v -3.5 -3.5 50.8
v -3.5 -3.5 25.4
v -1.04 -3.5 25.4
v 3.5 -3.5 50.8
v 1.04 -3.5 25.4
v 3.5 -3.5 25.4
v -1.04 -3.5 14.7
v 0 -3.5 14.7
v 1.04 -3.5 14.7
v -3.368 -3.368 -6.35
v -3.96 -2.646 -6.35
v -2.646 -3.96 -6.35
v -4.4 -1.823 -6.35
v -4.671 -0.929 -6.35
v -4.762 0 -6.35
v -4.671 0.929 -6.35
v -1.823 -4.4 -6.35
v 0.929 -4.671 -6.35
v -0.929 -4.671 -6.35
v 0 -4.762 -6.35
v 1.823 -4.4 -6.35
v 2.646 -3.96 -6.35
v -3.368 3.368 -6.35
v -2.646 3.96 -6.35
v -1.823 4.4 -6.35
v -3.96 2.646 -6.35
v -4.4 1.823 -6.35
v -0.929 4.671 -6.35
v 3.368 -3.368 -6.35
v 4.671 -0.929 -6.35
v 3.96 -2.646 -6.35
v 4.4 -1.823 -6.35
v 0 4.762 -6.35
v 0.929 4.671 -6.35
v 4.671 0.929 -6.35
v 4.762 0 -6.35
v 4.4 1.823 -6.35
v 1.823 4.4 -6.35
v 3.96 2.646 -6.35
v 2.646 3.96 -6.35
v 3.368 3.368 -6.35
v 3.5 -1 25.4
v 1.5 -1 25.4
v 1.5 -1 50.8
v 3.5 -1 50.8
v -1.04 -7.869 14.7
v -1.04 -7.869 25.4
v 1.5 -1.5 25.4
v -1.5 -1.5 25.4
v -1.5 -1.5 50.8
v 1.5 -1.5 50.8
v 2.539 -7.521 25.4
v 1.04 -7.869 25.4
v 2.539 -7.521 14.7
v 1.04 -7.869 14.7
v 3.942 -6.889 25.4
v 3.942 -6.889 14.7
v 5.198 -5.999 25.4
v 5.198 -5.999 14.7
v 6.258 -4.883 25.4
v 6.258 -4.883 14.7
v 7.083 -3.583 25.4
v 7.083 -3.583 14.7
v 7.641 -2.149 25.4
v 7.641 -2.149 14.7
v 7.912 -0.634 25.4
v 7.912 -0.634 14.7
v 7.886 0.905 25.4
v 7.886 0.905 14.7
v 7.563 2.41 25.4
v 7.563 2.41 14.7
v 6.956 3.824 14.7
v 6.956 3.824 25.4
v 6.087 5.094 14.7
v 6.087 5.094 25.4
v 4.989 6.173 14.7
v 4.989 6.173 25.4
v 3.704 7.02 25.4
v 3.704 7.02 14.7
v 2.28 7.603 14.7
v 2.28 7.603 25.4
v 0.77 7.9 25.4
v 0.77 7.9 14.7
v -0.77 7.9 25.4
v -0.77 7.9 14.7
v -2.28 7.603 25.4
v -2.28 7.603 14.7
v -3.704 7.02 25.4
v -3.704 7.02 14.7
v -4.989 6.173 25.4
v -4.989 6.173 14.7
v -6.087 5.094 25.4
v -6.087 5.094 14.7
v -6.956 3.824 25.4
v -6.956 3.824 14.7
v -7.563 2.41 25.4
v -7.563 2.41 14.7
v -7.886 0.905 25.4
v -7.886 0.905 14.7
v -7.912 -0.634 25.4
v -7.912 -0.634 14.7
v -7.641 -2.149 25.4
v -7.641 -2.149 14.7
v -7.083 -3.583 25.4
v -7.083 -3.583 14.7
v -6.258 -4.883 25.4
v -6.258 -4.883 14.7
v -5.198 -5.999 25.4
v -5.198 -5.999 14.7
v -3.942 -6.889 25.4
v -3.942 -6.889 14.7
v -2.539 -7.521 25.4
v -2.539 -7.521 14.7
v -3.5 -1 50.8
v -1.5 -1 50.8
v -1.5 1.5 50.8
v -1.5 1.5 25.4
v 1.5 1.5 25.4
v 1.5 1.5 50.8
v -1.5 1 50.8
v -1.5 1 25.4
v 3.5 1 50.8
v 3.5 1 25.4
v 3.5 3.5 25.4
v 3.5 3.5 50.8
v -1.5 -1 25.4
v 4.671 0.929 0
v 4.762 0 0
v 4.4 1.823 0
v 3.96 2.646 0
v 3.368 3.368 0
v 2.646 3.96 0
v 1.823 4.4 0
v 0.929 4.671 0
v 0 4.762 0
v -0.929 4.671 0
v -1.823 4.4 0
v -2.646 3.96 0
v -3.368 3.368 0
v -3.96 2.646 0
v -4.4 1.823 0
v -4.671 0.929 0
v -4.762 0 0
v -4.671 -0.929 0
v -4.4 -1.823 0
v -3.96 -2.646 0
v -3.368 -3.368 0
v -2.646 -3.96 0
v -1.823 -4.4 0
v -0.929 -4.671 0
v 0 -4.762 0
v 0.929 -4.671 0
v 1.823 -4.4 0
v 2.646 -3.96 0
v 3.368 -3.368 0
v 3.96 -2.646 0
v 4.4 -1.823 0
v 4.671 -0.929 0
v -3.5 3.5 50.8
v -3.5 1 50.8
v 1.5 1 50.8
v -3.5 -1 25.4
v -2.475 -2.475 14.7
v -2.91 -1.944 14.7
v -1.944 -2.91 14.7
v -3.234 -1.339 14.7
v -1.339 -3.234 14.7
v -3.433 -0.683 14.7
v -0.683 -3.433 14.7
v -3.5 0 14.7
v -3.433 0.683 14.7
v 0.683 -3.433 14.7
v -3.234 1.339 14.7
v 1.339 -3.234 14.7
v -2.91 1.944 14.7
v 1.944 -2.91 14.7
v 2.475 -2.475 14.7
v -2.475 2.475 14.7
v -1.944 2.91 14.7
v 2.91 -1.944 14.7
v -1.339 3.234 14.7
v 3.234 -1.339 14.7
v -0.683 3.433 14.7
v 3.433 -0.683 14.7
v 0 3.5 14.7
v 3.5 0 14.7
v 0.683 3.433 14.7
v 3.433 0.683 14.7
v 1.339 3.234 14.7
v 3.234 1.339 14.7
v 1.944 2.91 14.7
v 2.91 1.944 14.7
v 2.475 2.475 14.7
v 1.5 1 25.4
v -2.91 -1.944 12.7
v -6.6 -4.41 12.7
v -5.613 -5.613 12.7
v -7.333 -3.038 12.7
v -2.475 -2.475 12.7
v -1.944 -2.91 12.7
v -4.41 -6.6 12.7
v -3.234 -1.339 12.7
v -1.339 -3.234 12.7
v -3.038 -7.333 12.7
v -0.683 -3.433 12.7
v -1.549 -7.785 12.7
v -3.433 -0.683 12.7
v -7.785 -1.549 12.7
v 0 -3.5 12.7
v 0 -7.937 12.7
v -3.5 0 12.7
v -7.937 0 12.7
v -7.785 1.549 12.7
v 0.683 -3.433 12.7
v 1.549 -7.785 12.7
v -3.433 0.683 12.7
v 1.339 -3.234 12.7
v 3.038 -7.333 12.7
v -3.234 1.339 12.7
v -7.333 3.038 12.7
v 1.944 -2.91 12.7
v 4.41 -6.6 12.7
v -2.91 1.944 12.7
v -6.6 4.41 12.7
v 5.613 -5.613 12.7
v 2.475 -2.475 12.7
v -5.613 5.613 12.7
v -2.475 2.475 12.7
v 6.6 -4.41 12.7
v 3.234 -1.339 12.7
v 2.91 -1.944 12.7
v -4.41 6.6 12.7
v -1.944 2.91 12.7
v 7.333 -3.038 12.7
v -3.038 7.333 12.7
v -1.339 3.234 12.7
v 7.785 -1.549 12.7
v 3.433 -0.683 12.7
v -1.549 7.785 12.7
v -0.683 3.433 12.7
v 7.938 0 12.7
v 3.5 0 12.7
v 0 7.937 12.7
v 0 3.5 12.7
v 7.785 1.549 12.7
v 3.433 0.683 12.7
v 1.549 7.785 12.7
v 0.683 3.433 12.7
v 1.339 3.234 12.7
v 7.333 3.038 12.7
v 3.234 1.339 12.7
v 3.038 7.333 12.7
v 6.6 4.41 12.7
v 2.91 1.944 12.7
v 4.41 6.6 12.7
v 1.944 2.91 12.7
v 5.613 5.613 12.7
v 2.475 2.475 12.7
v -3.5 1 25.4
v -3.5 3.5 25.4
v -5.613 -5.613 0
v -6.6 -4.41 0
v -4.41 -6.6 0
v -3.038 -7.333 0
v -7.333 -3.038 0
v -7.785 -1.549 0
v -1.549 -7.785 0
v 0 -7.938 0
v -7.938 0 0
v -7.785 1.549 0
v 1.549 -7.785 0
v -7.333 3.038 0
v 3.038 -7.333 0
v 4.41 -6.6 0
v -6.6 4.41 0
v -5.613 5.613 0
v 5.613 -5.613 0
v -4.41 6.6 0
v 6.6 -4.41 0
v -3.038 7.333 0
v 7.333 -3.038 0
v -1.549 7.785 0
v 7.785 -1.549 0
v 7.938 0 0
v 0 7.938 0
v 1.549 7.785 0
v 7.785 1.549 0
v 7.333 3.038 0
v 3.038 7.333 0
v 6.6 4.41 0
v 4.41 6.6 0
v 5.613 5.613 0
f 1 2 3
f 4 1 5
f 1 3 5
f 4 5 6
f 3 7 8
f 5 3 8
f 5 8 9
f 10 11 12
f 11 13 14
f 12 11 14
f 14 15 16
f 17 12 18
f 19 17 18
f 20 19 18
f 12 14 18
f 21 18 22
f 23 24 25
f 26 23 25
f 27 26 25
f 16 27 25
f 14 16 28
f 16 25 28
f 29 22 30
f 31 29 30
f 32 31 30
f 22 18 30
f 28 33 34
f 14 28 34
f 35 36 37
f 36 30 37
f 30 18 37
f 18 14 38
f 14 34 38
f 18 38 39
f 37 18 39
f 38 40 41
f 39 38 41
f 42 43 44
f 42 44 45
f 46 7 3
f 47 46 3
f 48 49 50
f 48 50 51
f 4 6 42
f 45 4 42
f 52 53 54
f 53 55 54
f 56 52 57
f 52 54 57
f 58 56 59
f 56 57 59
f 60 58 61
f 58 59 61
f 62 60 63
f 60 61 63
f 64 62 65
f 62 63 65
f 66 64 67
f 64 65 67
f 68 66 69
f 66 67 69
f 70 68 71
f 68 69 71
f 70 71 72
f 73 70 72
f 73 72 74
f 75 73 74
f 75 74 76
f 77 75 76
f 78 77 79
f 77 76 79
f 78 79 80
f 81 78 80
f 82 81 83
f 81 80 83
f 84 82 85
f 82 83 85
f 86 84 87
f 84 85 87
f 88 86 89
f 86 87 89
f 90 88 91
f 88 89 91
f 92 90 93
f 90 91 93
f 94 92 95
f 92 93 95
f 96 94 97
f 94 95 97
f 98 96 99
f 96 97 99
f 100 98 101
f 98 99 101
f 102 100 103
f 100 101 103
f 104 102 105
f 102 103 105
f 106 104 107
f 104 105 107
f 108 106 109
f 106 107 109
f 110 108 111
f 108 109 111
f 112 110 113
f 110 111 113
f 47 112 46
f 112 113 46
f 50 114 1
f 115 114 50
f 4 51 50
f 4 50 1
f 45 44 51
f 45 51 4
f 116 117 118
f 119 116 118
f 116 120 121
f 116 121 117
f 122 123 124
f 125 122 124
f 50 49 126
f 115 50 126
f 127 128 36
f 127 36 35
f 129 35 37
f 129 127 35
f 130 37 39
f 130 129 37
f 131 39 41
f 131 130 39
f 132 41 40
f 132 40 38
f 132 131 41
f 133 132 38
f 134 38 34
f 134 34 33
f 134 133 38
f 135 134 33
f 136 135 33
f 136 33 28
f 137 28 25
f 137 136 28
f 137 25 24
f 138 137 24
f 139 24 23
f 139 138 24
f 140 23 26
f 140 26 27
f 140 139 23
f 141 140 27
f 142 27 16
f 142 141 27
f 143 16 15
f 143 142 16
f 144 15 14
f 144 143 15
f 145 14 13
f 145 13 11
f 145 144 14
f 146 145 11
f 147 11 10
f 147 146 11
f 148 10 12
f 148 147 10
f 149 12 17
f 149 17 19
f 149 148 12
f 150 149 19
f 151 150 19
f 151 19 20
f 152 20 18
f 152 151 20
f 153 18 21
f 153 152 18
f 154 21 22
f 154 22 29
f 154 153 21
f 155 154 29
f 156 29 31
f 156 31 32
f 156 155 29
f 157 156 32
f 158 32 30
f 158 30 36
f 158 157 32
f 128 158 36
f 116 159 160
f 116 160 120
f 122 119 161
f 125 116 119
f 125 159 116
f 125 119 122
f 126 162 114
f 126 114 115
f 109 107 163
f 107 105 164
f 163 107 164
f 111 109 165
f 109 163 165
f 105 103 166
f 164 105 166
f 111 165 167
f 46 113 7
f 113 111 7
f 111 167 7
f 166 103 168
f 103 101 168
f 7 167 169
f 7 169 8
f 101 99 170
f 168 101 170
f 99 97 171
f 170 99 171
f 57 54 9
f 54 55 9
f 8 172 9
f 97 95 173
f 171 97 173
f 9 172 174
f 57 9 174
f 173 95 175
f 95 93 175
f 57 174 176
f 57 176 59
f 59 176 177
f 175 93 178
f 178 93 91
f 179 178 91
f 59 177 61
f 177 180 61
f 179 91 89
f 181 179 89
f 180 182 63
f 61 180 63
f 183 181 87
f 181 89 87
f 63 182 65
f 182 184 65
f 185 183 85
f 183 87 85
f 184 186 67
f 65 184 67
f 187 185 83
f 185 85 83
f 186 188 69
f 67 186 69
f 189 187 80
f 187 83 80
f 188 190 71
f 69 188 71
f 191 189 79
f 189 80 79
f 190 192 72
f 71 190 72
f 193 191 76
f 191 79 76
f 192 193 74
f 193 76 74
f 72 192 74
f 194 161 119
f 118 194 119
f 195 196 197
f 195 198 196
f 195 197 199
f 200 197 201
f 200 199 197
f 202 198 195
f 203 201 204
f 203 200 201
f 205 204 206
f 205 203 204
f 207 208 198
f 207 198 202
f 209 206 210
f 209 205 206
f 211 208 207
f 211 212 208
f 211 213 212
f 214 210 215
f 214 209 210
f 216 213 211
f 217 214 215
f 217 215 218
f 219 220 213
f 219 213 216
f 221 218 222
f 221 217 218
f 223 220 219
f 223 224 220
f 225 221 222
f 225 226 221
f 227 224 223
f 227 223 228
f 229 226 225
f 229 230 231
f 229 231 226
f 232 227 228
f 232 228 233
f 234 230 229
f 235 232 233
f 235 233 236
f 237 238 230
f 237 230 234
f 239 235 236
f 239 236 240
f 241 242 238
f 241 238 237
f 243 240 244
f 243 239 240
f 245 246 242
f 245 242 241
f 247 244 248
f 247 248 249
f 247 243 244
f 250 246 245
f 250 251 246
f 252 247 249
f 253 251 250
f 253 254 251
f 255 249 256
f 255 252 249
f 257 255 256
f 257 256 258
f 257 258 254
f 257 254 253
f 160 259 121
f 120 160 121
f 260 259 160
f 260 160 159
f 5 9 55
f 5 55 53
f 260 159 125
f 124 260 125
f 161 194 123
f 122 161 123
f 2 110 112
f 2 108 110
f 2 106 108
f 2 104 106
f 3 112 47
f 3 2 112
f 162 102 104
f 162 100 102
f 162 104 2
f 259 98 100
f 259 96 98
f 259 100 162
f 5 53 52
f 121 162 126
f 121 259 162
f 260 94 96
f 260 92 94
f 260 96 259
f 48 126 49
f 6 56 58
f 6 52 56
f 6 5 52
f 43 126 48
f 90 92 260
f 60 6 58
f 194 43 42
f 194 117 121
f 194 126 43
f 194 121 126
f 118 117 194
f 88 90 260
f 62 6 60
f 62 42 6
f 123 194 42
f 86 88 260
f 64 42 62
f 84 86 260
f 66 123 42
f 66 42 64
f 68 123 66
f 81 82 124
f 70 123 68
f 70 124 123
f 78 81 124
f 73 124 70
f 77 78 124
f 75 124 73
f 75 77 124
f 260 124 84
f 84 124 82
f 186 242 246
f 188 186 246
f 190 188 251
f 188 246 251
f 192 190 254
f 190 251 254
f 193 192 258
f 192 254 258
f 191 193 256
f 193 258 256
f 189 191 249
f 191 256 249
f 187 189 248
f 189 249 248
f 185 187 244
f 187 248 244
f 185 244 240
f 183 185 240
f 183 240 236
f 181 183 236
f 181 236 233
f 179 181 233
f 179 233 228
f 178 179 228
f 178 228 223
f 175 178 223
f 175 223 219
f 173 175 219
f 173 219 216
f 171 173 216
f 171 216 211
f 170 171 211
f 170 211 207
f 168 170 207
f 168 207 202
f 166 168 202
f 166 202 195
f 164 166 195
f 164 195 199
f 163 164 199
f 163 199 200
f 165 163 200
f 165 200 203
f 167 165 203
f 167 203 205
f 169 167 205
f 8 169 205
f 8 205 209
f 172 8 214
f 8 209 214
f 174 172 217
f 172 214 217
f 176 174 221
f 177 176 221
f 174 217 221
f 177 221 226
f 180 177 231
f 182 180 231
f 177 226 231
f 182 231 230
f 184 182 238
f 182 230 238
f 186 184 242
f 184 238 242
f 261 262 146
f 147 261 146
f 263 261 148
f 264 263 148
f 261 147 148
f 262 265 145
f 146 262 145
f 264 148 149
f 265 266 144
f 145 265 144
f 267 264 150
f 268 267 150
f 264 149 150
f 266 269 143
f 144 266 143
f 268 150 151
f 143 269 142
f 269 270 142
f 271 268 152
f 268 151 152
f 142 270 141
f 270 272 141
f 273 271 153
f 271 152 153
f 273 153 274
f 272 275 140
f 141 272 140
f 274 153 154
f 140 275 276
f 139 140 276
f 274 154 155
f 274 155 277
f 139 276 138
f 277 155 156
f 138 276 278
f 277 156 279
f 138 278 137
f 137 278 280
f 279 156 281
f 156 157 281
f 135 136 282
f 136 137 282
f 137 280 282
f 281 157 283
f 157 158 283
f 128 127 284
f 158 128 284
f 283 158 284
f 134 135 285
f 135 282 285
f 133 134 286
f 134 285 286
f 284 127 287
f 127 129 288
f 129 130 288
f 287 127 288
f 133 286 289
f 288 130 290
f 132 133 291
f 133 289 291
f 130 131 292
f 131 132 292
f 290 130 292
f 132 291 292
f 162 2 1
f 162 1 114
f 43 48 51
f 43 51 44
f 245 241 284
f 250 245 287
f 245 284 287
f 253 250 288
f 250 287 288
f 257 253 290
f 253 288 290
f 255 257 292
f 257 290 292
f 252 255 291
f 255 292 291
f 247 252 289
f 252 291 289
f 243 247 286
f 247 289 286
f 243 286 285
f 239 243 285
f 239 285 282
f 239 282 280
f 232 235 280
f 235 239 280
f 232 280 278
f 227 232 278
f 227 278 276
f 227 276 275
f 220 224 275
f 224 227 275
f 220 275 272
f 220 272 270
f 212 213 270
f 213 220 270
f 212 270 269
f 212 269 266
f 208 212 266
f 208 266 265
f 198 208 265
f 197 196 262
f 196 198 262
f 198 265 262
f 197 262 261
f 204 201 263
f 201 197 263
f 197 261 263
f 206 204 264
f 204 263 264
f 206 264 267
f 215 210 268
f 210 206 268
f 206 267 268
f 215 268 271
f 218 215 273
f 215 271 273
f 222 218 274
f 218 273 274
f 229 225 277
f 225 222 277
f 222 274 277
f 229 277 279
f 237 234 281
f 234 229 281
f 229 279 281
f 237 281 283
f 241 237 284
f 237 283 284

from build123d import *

# Parameters (mm, degrees)
F0_R      = 7.9375
F1_DEPTH  = 25.4
F2_R      = 4.7625
F3_DEPTH  = 6.35
F4_W      = 7
F4_H      = 7
F5_DEPTH  = 25.4
F6_W      = 3
F6_H      = 3
F7_DEPTH  = 25.4
F9_W      = 15.748512
F9_H      = 2
F10_DEPTH = 25.4
F12_W     = 2.079316
F12_H     = 12.7
F13_DEPTH = 25.4
F15_R     = 7.9375
F15_R_2   = 3.5
F16_DEPTH = 2


with BuildPart() as f1:
    # F0 (on Top) → F1 (new body)
    with BuildSketch(Plane.XY):
        Circle(F0_R)
    extrude(amount=F1_DEPTH)

    # F2 (on Top) → F3 (join)
    with BuildSketch(Plane.XY):
        Circle(F2_R)
    extrude(amount=-F3_DEPTH)

    # F4 (on face) → F5 (join)
    with BuildSketch(Plane.XY.offset(25.4)):
        Rectangle(F4_W, F4_H)
    extrude(amount=F5_DEPTH)


with BuildPart() as f7:
    # F6 (on face) → F7 (new body)
    with BuildSketch(Plane.XY.offset(25.4)):
        Rectangle(F6_W, F6_H)
    extrude(amount=F7_DEPTH)


with BuildPart() as f1_1:
    add(f1.part)

    # F8: cut F7
    add(f7.part, mode=Mode.SUBTRACT)


with BuildPart() as f10:
    # F9 (on face) → F10 (new body)
    with BuildSketch(Plane.XY.offset(25.4)):
        Rectangle(F9_W, F9_H)
    extrude(amount=F10_DEPTH)


with BuildPart() as f1_2:
    add(f1_1.part)

    # F11: cut F10
    add(f10.part, mode=Mode.SUBTRACT)


with BuildPart() as f13:
    # F12 (on face) → F13 (new body)
    with BuildSketch(Plane.XZ.offset(3.5)):
        with Locations((0, 19.05)):
            Rectangle(F12_W, F12_H)
    extrude(amount=F13_DEPTH)


with BuildPart() as f1_3:
    add(f1_2.part)

    # F14: cut F13
    add(f13.part, mode=Mode.SUBTRACT)


with BuildPart() as f16:
    # F15 (on face) → F16 (new body)
    with BuildSketch(Plane.XY.offset(12.7)):
        Circle(F15_R)
        Circle(F15_R_2, mode=Mode.SUBTRACT)
    extrude(amount=F16_DEPTH)


with BuildPart() as f1_4:
    add(f1_3.part)

    # F17: cut F16
    add(f16.part, mode=Mode.SUBTRACT)


solid = f1_4.part
